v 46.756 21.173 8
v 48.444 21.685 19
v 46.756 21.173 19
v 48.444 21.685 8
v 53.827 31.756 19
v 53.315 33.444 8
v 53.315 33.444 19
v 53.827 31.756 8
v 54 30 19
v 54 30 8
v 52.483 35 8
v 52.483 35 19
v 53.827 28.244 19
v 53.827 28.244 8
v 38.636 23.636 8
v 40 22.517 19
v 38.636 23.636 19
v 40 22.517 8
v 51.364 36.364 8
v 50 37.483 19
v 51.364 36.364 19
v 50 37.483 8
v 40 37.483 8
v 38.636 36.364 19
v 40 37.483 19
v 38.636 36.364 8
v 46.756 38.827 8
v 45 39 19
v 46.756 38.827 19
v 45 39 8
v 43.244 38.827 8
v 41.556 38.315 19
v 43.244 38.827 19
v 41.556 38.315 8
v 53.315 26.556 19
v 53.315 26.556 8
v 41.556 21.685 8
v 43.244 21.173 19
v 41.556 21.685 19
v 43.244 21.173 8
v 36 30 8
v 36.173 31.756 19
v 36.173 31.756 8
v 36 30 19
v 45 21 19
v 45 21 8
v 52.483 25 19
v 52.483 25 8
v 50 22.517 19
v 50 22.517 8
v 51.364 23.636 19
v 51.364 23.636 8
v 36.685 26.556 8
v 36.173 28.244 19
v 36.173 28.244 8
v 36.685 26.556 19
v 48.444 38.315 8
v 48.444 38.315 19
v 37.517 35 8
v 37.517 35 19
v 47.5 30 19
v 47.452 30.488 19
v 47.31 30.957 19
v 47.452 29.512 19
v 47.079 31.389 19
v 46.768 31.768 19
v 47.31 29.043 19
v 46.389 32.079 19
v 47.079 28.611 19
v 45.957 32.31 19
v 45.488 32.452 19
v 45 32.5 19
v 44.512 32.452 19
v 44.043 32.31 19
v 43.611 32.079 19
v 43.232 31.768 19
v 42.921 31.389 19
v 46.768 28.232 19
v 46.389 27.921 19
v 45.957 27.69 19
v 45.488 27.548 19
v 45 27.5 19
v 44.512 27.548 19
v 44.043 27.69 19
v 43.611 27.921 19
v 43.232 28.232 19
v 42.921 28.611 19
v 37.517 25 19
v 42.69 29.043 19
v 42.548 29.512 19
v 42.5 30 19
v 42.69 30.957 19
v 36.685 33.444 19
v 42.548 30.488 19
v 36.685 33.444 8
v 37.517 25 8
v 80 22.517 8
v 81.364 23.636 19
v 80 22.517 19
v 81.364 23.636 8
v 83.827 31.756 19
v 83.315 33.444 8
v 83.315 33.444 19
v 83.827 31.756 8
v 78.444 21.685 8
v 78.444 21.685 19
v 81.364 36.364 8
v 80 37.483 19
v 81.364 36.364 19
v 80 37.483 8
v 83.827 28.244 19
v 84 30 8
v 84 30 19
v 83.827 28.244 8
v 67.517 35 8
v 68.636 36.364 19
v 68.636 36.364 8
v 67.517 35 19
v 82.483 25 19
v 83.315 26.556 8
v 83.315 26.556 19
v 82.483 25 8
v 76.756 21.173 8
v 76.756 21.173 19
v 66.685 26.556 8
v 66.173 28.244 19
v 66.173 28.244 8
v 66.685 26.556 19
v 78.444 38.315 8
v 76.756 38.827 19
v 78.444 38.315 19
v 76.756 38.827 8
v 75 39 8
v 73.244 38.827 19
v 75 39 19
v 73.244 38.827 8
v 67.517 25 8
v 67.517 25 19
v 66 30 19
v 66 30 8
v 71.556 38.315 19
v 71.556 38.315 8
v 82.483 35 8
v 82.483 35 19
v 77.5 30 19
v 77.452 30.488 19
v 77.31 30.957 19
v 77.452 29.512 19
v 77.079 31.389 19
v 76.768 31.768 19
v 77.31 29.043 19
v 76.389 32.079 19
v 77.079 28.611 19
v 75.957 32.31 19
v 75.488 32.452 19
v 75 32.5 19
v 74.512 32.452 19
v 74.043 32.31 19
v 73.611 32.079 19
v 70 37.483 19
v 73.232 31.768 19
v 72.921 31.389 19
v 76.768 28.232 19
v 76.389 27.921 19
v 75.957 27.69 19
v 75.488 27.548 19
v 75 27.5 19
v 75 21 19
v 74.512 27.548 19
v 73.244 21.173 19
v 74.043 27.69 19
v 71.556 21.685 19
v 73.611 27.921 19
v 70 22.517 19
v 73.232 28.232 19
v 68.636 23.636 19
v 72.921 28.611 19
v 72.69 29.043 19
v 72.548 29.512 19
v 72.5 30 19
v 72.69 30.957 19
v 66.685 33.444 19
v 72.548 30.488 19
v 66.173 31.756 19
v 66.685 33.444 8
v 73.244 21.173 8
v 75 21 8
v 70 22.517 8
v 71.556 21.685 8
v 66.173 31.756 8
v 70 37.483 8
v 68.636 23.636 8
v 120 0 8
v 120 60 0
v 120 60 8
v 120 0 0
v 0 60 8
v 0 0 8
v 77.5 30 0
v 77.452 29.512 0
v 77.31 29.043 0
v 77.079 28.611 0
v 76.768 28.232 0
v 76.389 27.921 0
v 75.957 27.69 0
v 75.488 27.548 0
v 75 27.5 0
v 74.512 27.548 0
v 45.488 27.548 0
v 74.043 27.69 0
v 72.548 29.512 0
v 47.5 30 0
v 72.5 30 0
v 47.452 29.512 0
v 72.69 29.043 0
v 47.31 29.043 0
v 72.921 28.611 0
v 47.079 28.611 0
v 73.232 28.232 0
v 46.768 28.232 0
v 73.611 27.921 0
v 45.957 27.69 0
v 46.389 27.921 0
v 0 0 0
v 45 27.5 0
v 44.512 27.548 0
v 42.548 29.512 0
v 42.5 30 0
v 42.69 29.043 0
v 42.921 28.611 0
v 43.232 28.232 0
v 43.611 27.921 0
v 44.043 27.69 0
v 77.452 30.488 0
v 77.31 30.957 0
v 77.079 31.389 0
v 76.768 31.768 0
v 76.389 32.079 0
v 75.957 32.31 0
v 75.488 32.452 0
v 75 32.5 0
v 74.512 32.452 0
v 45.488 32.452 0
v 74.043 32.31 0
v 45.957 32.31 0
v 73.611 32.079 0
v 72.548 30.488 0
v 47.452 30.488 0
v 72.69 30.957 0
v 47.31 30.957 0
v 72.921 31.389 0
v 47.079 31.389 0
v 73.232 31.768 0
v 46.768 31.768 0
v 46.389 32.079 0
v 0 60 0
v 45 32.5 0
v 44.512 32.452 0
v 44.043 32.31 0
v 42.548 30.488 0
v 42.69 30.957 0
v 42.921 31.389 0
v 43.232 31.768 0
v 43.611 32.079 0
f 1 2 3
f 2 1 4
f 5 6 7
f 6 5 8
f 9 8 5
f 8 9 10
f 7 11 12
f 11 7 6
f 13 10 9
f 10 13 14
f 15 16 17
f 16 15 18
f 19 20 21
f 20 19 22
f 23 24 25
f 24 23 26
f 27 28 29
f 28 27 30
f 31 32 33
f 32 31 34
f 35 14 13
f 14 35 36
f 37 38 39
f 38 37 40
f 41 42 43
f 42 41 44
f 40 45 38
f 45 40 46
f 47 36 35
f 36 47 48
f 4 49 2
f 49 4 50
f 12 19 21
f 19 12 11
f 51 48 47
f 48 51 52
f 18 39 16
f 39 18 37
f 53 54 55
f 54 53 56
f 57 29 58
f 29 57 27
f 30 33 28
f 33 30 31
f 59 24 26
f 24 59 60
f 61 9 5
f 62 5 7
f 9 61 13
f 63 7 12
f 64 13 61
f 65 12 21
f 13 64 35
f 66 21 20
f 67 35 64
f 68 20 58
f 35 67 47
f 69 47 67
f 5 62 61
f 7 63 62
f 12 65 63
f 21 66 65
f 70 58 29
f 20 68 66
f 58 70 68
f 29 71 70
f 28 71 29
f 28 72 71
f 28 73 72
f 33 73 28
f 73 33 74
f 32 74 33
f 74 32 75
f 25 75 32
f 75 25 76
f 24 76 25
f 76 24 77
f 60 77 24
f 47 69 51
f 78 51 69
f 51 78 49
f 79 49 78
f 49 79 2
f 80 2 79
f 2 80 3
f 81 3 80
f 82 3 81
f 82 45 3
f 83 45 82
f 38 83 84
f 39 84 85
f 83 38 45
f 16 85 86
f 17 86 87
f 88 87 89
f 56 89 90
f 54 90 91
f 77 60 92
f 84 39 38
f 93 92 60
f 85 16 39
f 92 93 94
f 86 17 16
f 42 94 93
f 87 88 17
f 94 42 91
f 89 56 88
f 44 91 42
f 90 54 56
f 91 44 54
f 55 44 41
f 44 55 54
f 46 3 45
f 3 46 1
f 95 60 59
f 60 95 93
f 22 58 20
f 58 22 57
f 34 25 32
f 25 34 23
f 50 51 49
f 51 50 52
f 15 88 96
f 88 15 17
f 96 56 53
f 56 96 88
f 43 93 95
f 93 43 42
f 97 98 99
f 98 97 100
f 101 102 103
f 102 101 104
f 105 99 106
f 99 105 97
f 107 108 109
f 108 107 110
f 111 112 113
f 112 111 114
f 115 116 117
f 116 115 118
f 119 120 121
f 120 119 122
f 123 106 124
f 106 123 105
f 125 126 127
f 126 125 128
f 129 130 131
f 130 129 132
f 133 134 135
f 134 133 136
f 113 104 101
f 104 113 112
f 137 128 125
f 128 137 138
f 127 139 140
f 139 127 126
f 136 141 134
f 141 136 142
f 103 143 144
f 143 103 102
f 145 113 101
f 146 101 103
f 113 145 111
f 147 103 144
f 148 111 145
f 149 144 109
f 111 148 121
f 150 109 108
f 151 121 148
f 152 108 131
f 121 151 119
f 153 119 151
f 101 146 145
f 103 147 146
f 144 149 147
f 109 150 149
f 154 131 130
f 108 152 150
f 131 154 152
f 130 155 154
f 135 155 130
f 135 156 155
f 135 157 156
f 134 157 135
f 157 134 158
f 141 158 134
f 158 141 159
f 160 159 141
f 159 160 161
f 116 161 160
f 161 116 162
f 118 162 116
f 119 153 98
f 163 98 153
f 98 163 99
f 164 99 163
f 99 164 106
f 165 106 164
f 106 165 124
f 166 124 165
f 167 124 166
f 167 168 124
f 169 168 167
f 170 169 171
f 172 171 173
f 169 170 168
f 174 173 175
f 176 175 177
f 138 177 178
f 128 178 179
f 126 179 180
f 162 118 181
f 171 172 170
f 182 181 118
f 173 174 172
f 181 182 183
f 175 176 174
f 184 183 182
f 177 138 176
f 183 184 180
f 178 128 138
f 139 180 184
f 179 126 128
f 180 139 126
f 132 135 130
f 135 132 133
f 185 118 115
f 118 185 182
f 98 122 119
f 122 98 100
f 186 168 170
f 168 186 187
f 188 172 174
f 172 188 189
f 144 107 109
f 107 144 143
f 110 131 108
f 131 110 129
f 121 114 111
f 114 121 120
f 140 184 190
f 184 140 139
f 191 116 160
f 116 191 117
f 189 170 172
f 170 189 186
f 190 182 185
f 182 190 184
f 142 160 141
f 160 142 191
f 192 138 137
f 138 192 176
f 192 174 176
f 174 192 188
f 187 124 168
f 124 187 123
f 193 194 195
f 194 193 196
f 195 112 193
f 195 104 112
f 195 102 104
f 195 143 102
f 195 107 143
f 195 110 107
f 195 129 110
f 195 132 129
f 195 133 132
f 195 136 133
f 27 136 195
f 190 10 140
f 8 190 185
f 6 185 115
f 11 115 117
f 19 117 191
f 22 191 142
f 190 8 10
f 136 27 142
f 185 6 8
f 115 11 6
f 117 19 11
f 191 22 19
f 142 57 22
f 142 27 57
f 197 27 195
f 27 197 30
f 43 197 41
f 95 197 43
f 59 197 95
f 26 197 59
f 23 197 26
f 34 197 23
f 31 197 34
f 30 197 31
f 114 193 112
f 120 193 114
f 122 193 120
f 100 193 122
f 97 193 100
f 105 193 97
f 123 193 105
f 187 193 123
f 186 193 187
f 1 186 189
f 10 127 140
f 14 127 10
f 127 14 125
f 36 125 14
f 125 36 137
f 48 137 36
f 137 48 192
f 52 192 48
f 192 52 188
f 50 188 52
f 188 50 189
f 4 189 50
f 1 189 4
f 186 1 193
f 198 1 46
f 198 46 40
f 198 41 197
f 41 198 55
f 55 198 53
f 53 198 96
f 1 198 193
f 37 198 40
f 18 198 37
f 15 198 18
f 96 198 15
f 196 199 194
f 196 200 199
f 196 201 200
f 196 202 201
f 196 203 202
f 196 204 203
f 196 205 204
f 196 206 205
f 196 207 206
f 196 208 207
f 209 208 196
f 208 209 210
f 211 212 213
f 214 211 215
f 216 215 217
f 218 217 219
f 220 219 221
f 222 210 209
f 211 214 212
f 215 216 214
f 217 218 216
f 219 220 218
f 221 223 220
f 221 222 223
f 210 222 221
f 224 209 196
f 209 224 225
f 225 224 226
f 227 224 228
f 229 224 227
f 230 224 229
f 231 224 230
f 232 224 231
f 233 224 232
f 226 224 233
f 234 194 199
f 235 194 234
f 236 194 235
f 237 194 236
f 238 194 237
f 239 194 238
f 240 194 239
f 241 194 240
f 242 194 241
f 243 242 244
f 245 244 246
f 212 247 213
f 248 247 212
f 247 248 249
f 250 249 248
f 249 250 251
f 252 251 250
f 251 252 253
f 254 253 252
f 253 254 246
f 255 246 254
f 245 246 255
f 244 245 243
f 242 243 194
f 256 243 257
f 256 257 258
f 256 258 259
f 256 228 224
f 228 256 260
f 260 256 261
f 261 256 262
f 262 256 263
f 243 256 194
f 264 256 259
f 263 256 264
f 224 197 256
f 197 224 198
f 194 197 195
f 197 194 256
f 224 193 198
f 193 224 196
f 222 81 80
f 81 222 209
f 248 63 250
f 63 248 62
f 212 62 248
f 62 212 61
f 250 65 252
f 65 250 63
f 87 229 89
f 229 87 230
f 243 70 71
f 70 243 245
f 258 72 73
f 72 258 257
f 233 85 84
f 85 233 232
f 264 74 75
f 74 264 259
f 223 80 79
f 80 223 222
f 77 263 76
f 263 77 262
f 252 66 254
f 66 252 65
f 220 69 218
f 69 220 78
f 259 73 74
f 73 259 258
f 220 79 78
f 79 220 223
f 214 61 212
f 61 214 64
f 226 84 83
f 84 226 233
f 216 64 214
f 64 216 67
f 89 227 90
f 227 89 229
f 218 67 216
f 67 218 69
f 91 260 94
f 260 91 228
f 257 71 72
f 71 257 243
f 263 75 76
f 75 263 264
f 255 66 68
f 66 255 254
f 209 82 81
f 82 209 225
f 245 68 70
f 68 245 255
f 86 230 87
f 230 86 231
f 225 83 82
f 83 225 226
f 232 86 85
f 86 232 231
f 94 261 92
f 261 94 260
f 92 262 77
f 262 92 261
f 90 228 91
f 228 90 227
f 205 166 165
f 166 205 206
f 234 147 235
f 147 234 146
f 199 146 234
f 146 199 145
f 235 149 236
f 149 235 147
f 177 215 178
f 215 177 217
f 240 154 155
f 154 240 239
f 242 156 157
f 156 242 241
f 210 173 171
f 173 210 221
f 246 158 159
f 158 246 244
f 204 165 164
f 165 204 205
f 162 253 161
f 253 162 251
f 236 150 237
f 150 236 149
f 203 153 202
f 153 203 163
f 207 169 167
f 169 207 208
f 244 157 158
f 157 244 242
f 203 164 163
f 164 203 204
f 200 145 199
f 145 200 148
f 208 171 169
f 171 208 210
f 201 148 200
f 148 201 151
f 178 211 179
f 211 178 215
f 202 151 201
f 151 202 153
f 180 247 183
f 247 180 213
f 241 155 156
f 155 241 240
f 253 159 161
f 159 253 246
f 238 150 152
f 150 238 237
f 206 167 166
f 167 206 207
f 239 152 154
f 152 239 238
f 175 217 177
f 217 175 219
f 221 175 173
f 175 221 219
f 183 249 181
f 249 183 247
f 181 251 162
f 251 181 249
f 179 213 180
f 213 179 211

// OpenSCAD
$fn = 32;

// ----------------------------------------------------------------------
// Drill jig: two_boss jig
// ----------------------------------------------------------------------

// --- parameters (mm) ---
plate_l = 120;            // plate length, X
plate_w = 60;             // plate width, Y
plate_t = 8;              // plate thickness
boss_d = 18;              // guide boss diameter
boss_h = 12;              // boss height above the plate
guide_d = 5;              // guide hole diameter
boss_pitch = 30;          // boss pitch

n_boss = 2;  // guide bosses
boss_x0 = (plate_l - (n_boss - 1) * boss_pitch) / 2;  // first boss X
boss_top = plate_t - 1 + boss_h;  // boss crown height
total_h = boss_top;  // overall height

difference() {
  union() {
  cube([plate_l, plate_w, plate_t]);
  for (i = [0 : n_boss - 1])
    translate([boss_x0 + i * boss_pitch, plate_w / 2, plate_t - 1])
      cylinder(h = boss_h, d = boss_d);
  }
  for (i = [0 : n_boss - 1])
    translate([boss_x0 + i * boss_pitch, plate_w / 2, -1])
      cylinder(h = plate_t + boss_h, d = guide_d);
}
